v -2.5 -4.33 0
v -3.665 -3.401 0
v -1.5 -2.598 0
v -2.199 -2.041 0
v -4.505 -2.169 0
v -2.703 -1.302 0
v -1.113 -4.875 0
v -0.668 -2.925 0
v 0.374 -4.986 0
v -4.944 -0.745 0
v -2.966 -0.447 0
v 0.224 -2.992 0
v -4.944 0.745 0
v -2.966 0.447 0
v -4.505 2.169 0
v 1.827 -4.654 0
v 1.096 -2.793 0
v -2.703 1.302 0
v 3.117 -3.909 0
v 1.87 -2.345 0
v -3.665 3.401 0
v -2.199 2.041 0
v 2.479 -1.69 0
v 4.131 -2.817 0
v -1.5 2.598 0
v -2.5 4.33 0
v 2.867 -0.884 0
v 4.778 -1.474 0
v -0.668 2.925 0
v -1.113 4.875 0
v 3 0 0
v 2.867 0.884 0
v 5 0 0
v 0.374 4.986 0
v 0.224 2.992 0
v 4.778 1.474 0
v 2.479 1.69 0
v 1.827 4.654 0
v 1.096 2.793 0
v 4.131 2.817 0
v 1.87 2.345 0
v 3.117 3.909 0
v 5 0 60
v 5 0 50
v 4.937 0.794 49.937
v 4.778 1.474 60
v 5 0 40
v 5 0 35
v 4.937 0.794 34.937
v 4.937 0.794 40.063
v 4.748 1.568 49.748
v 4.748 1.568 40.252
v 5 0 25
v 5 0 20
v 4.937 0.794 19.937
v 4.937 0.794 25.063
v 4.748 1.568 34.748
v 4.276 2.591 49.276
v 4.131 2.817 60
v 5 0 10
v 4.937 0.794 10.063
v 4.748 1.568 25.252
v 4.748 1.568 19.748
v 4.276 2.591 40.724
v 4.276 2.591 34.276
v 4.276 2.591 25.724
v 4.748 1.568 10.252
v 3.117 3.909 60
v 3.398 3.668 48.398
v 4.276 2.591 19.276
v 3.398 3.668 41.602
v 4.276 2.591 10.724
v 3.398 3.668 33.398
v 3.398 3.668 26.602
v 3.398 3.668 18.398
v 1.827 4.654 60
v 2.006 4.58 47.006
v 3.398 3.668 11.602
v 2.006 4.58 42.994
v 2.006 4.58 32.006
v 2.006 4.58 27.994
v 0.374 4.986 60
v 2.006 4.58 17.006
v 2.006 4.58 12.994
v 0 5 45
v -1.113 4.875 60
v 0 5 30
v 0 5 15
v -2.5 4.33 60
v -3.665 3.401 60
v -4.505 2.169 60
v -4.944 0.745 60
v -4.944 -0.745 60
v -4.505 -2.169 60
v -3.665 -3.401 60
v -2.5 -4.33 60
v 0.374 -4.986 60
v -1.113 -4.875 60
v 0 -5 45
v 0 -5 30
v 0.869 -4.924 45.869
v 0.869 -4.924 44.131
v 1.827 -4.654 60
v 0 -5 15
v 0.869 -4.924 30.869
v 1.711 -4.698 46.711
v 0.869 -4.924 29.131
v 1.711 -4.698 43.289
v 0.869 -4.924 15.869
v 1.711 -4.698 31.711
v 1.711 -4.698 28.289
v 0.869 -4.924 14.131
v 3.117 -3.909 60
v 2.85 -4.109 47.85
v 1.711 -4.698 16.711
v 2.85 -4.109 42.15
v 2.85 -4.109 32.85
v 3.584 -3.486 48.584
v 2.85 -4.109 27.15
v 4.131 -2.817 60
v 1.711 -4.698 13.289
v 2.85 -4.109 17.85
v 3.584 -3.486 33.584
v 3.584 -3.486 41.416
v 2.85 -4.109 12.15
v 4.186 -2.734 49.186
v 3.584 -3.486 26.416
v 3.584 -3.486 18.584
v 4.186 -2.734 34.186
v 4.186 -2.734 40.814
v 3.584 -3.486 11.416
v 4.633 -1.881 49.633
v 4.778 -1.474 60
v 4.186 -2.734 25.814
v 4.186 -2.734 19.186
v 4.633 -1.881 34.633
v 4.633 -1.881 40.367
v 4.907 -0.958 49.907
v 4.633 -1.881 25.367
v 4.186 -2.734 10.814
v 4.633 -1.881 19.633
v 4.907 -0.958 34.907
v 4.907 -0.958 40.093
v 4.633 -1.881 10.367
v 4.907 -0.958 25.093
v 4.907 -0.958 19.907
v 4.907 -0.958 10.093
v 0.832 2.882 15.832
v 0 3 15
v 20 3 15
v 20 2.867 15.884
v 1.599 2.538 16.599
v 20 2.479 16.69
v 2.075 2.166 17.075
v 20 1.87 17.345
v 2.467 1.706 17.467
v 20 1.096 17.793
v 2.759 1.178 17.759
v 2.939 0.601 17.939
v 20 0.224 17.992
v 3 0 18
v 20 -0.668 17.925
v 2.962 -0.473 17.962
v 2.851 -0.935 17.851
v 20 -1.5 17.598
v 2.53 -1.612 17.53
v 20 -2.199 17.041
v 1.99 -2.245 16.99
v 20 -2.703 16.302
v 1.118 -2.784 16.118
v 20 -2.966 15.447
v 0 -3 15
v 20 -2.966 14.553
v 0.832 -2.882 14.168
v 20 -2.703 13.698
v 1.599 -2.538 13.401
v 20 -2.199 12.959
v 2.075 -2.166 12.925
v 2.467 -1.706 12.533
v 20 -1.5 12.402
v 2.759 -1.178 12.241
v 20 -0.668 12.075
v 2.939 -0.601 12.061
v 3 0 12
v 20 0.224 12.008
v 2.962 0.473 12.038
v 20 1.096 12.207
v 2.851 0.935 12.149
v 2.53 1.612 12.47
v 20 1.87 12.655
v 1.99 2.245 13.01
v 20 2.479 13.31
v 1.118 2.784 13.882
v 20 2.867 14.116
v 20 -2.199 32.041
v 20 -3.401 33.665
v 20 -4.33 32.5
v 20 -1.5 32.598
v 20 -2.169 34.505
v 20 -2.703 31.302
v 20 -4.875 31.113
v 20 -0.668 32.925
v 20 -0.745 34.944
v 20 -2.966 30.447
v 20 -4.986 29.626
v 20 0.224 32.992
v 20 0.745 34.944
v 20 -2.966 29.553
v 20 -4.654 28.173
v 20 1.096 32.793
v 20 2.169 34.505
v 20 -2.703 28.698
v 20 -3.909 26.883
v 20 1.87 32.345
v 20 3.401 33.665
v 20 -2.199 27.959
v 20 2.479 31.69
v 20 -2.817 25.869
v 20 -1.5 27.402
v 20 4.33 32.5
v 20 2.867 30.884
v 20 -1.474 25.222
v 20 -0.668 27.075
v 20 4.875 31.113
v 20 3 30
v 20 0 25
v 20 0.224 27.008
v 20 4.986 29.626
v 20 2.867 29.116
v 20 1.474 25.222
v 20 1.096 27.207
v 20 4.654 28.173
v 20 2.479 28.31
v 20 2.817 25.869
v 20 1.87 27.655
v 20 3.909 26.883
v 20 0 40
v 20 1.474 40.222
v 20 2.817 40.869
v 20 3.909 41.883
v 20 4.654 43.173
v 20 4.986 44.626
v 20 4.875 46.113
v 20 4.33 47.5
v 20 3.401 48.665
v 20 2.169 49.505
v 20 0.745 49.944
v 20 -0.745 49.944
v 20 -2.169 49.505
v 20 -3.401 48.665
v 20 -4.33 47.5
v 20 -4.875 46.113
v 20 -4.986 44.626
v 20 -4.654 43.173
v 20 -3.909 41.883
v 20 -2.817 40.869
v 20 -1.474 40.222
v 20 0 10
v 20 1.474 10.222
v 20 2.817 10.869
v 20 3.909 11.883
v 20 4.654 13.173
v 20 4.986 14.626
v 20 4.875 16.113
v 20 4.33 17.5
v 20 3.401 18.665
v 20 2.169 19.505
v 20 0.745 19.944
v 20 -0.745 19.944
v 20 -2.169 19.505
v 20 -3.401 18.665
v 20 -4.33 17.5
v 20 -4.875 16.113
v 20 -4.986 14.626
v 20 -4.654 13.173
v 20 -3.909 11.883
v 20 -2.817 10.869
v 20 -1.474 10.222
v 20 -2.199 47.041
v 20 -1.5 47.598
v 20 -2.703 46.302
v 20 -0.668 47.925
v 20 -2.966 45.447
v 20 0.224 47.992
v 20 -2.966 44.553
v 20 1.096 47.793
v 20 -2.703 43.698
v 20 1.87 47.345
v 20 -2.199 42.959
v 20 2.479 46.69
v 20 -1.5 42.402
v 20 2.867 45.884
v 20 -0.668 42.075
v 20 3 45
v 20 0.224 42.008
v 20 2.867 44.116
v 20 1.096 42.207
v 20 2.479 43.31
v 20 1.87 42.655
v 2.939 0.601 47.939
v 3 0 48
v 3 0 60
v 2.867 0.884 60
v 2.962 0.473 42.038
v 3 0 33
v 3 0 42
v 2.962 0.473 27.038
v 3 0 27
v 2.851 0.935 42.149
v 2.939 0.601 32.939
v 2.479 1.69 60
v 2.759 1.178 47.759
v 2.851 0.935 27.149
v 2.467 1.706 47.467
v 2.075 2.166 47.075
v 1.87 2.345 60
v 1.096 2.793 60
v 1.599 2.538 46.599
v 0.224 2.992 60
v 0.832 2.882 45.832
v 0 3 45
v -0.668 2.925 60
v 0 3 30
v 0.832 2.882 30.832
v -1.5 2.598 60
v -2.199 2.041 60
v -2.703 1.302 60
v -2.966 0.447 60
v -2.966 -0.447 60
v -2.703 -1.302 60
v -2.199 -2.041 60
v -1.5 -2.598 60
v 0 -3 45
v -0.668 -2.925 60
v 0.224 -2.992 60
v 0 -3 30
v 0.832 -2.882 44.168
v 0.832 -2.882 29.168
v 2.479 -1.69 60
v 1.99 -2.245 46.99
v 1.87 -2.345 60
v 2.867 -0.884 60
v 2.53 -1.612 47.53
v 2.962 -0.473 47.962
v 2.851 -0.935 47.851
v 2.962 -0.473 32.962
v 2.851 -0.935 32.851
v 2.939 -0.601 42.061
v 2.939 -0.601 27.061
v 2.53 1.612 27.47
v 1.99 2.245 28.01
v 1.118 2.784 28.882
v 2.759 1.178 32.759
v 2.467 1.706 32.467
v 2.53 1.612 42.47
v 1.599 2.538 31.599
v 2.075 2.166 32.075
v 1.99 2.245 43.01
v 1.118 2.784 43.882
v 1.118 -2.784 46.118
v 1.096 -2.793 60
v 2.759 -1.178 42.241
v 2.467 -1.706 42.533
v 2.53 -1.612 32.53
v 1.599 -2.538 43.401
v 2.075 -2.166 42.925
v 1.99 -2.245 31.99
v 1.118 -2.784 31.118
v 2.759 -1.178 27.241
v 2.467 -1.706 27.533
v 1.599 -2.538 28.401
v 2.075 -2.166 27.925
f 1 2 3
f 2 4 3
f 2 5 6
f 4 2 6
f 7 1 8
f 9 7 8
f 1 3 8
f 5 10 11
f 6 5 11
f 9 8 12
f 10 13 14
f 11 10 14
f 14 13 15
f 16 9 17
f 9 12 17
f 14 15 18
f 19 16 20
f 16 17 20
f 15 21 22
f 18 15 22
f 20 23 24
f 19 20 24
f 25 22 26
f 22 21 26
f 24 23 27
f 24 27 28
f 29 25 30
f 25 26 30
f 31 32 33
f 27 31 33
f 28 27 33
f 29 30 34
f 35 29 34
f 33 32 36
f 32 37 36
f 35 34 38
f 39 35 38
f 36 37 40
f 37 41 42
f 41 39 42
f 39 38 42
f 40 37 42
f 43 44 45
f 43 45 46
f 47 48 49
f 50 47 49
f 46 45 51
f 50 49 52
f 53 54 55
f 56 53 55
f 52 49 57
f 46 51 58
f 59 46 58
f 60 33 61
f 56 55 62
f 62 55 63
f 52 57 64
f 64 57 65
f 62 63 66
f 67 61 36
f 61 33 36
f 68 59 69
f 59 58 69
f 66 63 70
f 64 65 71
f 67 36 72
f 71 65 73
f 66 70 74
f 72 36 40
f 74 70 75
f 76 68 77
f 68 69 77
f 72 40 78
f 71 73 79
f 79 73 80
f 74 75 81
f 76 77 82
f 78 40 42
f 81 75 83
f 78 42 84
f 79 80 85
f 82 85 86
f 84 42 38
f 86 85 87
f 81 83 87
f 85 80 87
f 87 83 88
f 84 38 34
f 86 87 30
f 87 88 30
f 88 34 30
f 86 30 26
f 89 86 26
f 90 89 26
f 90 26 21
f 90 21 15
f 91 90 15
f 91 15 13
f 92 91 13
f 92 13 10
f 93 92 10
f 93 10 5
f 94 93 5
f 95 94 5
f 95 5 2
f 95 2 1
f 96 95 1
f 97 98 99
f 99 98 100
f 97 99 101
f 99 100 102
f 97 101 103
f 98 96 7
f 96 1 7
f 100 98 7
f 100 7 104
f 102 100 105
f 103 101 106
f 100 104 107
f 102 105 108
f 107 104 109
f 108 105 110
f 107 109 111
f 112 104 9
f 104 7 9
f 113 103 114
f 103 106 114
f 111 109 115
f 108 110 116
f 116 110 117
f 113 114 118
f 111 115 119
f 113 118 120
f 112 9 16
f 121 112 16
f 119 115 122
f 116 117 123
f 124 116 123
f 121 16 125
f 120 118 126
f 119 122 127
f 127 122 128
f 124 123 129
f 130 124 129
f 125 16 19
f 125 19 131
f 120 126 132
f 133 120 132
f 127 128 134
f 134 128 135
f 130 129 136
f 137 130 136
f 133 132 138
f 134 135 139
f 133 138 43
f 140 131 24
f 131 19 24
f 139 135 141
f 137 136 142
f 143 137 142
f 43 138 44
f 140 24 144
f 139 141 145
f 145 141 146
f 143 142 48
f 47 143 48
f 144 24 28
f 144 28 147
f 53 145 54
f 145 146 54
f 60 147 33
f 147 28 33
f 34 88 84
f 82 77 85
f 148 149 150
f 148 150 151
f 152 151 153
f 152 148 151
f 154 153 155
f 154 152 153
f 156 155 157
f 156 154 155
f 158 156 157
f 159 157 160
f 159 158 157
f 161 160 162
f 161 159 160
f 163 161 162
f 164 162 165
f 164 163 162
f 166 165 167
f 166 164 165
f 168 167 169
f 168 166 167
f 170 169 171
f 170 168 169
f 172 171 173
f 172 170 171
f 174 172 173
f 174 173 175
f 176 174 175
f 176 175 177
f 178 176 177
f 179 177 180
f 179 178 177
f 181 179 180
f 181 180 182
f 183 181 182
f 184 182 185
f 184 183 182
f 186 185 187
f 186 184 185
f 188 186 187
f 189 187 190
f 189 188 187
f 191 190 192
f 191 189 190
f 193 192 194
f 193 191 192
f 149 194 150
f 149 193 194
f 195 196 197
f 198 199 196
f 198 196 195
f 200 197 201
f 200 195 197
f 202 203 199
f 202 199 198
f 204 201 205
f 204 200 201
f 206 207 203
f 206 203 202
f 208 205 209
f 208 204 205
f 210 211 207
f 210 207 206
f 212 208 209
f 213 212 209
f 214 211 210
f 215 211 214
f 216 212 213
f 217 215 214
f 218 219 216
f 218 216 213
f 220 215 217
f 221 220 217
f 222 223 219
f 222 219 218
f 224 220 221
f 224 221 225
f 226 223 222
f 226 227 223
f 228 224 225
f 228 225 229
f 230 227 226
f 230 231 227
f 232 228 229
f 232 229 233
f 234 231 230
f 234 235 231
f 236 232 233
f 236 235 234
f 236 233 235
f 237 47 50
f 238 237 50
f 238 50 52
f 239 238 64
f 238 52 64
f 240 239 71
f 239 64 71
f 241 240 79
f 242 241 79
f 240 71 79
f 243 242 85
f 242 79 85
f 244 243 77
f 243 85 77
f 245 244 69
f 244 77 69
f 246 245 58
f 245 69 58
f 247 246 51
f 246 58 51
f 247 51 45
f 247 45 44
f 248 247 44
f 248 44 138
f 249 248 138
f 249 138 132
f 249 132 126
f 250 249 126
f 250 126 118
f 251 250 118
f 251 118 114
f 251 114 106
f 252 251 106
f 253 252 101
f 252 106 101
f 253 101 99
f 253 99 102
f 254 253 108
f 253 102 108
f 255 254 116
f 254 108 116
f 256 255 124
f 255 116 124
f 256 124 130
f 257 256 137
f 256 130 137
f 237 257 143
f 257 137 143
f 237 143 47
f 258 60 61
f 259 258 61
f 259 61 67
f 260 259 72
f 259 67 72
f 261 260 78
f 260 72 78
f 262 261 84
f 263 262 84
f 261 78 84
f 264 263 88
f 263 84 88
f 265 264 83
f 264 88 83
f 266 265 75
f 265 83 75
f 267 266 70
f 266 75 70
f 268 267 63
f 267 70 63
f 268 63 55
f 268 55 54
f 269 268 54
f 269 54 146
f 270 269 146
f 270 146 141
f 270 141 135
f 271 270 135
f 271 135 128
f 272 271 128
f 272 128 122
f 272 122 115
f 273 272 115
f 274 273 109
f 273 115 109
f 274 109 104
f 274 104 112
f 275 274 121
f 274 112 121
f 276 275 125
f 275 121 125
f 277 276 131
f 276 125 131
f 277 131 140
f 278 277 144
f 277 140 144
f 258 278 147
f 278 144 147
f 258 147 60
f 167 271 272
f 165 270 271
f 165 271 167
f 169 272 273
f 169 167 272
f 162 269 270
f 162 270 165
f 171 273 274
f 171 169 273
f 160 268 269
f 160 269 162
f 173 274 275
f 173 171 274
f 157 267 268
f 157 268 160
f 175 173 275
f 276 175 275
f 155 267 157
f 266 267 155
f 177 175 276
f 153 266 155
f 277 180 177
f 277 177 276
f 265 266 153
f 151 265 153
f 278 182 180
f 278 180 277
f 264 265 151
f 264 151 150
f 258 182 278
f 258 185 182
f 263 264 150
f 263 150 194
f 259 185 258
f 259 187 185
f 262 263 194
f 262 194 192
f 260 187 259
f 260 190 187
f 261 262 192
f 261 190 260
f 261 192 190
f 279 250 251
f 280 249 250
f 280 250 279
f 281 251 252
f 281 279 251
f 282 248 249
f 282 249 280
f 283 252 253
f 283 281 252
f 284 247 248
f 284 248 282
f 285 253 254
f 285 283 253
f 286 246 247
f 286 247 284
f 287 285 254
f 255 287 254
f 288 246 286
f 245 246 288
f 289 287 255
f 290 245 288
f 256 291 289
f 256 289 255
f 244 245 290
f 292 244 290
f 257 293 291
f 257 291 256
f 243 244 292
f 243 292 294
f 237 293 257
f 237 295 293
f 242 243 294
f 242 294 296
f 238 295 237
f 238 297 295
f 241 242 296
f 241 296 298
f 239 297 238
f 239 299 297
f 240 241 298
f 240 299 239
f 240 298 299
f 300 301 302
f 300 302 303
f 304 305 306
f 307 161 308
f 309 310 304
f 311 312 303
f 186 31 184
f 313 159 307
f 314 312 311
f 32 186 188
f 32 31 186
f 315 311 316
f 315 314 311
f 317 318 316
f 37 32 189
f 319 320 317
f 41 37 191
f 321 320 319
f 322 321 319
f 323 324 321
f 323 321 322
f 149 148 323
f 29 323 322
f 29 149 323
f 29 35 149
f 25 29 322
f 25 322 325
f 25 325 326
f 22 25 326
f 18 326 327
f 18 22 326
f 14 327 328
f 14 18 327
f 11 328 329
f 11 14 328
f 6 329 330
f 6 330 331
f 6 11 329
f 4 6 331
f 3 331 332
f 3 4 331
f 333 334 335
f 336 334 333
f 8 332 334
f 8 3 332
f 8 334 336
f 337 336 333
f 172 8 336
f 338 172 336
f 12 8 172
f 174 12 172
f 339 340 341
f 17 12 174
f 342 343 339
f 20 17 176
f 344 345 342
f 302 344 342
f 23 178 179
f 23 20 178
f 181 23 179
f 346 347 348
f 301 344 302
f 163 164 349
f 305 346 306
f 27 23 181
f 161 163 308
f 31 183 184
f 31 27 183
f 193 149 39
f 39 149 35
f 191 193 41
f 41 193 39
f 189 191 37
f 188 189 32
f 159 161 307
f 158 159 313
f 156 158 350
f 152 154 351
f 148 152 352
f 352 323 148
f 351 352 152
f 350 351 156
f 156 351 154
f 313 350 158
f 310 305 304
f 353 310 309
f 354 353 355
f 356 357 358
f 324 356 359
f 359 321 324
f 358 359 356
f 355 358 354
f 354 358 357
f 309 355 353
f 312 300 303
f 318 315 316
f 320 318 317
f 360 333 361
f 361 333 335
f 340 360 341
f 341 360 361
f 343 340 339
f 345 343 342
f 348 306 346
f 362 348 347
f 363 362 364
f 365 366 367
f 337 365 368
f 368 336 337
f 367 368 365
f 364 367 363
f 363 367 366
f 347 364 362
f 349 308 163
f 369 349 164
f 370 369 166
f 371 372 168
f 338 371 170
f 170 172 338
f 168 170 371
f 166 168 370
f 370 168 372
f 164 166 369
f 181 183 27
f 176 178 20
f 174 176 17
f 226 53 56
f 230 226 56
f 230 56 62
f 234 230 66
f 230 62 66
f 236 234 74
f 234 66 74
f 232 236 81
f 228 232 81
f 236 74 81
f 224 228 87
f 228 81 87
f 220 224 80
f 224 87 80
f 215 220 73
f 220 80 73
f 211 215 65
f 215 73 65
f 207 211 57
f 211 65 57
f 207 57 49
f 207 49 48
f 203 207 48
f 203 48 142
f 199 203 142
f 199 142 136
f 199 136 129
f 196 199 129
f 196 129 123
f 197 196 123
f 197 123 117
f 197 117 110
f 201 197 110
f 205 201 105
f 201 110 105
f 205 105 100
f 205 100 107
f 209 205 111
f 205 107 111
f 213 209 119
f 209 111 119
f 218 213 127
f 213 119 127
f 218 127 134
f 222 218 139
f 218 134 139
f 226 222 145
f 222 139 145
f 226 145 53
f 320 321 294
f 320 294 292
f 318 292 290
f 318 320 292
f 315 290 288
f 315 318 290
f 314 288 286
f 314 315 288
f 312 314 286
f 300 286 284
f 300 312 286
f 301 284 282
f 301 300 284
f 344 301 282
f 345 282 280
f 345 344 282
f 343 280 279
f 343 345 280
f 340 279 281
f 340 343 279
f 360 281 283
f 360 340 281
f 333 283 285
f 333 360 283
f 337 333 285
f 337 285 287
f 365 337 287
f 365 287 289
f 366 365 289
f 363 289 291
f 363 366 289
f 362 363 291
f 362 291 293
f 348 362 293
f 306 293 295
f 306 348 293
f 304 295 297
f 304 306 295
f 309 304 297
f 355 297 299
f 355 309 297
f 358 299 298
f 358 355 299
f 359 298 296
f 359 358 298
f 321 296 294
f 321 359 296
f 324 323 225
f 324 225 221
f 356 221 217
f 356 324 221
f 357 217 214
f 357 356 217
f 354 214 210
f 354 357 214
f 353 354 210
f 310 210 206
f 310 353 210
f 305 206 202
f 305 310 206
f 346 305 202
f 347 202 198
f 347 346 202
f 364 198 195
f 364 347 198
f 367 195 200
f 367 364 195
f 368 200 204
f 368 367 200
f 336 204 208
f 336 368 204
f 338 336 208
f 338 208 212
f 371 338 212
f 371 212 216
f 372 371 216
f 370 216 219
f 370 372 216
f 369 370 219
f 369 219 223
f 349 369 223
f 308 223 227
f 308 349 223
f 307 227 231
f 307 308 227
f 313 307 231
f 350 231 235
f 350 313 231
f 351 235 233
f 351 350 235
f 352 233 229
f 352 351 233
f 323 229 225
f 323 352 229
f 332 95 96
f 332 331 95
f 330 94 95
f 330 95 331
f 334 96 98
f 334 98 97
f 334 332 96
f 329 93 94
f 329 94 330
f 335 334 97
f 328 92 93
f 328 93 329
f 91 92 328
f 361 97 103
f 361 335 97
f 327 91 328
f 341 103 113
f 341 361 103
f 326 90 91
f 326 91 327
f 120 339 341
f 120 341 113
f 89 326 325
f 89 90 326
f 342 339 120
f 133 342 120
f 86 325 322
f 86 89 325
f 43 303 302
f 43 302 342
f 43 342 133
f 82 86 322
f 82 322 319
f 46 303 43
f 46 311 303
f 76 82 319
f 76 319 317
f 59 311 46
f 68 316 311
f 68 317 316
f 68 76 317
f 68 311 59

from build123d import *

# Parameters (mm, degrees)
ESQUISSE1_R        = 5
BOSS_EXTRU_1_DEPTH = 60
ESQUISSE2_R        = 5
BOSS_EXTRU_2_DEPTH = 20
COQUE1_START       = -1e-07
COQUE1_OUTLINE_R   = 3
COQUE1_DEPTH       = 20.0000001
COQUE1_2_OUTLINE_R = 3
COQUE1_2_DEPTH     = 60


with BuildPart() as part:
    # Esquisse1 → Boss.-Extru.1 (new body)
    with BuildSketch(Plane.XY):
        Circle(ESQUISSE1_R)
    extrude(amount=BOSS_EXTRU_1_DEPTH)

    # Esquisse2 → Boss.-Extru.2 (add)
    with BuildSketch(Plane(origin=(0, 0, 0), x_dir=(0, 0, -1), z_dir=(1, 0, 0))):
        with Locations((-15, 0)):
            Circle(ESQUISSE2_R)
        with Locations((-30, 0)):
            Circle(ESQUISSE2_R)
        with Locations((-45, 0)):
            Circle(ESQUISSE2_R)
    extrude(amount=BOSS_EXTRU_2_DEPTH)

    # Coque1: read off the stored shape, not the designer's step
    # Coque1 outline → Coque1 (cut)
    with BuildSketch(Plane.YZ.offset(COQUE1_START)):
        with Locations((0, 15)):
            Circle(COQUE1_OUTLINE_R)
        with Locations((0, 30)):
            Circle(COQUE1_OUTLINE_R)
        with Locations((0, 45)):
            Circle(COQUE1_OUTLINE_R)
    extrude(amount=COQUE1_DEPTH, mode=Mode.SUBTRACT)

    # Coque1 2 outline → Coque1 2 (cut)
    with BuildSketch(Plane.XY):
        Circle(COQUE1_2_OUTLINE_R)
    extrude(amount=COQUE1_2_DEPTH, mode=Mode.SUBTRACT)


solid = part.part
